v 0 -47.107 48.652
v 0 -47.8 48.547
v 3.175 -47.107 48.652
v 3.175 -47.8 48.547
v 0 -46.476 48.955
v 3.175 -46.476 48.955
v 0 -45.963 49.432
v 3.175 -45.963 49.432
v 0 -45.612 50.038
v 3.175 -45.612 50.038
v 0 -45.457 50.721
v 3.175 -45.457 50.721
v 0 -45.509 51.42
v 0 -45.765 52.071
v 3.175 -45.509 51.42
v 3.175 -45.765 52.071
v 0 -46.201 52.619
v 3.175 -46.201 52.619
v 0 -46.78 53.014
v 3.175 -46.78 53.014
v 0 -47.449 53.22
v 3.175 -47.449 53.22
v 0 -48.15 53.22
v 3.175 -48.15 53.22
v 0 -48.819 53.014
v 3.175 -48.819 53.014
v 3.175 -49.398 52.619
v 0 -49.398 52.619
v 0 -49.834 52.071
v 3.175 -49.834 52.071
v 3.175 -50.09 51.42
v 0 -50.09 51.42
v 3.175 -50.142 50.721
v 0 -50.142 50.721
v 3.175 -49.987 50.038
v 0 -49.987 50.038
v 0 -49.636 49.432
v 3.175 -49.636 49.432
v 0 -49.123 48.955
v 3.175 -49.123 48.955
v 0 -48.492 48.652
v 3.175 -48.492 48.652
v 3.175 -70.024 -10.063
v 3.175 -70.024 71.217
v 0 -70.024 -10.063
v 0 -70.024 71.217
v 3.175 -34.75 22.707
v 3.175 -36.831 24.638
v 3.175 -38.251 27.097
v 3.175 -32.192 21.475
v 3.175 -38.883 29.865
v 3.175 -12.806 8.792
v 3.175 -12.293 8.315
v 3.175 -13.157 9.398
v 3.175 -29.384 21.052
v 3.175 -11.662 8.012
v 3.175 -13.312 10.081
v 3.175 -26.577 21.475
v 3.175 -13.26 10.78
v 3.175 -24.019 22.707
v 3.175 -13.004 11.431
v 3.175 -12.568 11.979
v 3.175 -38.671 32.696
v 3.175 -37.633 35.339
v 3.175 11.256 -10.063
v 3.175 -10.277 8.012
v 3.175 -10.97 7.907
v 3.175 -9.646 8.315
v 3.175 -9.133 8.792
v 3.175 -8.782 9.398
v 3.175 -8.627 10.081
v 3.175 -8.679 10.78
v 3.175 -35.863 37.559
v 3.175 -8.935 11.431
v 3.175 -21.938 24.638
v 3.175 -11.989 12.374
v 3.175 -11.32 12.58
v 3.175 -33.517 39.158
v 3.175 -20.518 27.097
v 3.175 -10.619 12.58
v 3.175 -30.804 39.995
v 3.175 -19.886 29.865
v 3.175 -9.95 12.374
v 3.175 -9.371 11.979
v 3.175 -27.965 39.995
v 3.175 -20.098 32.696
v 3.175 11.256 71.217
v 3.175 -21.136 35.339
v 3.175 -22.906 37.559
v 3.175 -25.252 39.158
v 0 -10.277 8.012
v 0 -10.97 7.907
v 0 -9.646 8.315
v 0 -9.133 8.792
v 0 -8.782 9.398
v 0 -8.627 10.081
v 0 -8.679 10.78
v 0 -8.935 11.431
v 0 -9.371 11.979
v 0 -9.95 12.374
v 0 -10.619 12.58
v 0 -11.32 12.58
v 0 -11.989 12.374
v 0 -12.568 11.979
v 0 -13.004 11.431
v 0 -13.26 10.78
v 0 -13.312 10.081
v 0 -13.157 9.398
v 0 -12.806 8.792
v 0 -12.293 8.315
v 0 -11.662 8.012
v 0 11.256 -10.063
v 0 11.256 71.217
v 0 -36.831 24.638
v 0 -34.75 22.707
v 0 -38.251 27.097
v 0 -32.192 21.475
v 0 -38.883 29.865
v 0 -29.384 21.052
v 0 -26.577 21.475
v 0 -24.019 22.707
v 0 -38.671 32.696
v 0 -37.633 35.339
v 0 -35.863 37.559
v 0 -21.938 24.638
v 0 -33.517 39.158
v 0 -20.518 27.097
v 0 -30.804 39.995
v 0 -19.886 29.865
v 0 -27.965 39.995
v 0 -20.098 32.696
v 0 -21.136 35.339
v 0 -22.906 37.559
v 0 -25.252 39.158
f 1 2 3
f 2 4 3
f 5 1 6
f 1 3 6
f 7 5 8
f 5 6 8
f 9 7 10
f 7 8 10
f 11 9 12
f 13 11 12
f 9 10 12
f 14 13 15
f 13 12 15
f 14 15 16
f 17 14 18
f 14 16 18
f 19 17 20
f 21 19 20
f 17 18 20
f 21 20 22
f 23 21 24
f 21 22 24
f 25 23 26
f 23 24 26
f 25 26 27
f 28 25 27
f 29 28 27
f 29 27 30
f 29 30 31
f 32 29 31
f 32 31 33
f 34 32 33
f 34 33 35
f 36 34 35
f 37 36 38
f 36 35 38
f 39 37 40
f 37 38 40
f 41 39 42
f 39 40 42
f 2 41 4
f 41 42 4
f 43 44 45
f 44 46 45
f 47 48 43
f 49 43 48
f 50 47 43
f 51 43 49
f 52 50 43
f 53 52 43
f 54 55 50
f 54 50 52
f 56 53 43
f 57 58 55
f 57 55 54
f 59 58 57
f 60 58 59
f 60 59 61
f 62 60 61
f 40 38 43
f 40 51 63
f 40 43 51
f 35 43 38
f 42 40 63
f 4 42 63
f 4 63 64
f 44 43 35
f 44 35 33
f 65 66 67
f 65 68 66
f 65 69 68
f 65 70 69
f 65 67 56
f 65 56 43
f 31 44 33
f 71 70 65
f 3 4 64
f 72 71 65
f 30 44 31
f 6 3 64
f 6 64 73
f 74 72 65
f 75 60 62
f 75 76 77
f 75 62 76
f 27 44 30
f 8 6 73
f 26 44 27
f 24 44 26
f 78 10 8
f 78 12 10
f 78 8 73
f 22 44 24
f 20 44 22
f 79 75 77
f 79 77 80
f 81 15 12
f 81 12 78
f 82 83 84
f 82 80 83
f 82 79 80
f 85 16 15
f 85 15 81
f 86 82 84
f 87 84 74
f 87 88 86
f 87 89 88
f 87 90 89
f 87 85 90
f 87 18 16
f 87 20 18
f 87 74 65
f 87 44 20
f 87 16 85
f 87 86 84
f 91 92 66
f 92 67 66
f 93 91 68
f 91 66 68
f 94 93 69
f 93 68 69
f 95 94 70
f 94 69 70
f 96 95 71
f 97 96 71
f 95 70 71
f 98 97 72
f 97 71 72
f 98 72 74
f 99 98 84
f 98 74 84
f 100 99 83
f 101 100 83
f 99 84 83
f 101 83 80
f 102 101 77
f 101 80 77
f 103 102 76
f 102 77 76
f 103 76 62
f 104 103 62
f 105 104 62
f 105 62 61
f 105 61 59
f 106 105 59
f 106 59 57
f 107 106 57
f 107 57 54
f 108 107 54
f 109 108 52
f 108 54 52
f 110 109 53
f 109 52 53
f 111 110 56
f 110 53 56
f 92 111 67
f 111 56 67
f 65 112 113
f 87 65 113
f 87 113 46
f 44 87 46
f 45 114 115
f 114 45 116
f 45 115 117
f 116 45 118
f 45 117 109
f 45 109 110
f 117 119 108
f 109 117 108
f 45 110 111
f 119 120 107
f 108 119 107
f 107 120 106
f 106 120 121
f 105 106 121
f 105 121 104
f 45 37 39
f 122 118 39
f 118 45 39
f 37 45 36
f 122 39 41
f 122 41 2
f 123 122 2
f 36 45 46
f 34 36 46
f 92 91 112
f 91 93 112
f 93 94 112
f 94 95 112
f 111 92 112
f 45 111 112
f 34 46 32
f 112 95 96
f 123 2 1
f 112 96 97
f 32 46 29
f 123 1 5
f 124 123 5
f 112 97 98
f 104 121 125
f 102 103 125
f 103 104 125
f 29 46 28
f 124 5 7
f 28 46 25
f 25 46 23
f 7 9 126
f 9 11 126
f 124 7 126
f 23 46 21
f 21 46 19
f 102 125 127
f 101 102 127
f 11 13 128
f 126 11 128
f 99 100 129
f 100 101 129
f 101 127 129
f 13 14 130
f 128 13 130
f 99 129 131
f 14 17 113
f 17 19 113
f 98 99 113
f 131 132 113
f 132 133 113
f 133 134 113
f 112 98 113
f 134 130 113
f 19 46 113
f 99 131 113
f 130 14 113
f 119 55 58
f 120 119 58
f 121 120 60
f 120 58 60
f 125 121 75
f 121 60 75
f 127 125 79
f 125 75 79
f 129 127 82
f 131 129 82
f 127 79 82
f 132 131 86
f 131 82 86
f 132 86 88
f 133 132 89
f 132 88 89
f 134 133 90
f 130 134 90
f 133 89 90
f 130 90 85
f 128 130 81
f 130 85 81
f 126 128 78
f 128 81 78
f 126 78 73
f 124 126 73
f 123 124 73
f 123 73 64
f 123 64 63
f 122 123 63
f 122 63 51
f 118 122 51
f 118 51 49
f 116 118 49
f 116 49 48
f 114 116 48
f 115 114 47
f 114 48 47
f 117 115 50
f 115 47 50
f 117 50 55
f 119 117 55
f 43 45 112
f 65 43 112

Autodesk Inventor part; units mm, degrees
ref_plane "YZ Plane" through (0, 0, 0) normal (1, 0, 0) x (0, 1, 0)
ref_plane "XZ Plane" through (0, 0, 0) normal (0, 1, 0) x (-1, 0, 0)
ref_plane "XY Plane" through (0, 0, 0) normal (0, 0, 1) x (1, 0, 0)
sketch "Sketch1" plane through (0, 0, 0) normal (1, 0, 0) x (0, 1, 0)
  line L0 (11.2555, 71.2167) -> (-70.0245, 71.2167)
  line L1 (-70.0245, 71.2167) -> (-70.0245, -10.0633)
  line L2 (-70.0245, -10.0633) -> (11.2555, -10.0633)
  line L3 (11.2555, -10.0633) -> (11.2555, 71.2167)
  point P0 (0, 0)
  dimension "d0" = 81.28
  dimension "d1" = 81.28
extrude "Extrusion1" add sketch "Sketch1" along normal blind 3.175
sketch "Sketch2" plane through (3.175, 0, 0) normal (1, 0, 0) x (0, 0, -1)
  circle A0 centre (-30.5767, -29.3845) radius 9.525
  line L0 (10.0633, 11.2555) -> (-71.2167, 11.2555) projected
  line L1 (-71.2167, 11.2555) -> (-71.2167, -70.0245) projected
  circle A1 centre (-10.2567, -10.9695) radius 2.3495
  circle A2 centre (-50.8967, -47.7995) radius 2.3495
  line L2 (-71.2167, -70.0245) -> (10.0633, -70.0245) projected
  line L3 (10.0633, -70.0245) -> (10.0633, 11.2555) projected
  point P0 (0, 0)
  dimension "d4" = 19.05
  dimension "d5" = 40.64
  dimension "d6" = 40.64
  dimension "d9" = 4.699
  dimension "d10" = 4.699
  dimension "d11" = 20.32
  dimension "d12" = 22.225
  dimension "d13" = 22.225
  dimension "d14" = 20.32
extrude "Extrusion2" cut sketch "Sketch2" against normal blind 3.175 contours A0 | A1 | A2
properties part number "Guard Plate"
